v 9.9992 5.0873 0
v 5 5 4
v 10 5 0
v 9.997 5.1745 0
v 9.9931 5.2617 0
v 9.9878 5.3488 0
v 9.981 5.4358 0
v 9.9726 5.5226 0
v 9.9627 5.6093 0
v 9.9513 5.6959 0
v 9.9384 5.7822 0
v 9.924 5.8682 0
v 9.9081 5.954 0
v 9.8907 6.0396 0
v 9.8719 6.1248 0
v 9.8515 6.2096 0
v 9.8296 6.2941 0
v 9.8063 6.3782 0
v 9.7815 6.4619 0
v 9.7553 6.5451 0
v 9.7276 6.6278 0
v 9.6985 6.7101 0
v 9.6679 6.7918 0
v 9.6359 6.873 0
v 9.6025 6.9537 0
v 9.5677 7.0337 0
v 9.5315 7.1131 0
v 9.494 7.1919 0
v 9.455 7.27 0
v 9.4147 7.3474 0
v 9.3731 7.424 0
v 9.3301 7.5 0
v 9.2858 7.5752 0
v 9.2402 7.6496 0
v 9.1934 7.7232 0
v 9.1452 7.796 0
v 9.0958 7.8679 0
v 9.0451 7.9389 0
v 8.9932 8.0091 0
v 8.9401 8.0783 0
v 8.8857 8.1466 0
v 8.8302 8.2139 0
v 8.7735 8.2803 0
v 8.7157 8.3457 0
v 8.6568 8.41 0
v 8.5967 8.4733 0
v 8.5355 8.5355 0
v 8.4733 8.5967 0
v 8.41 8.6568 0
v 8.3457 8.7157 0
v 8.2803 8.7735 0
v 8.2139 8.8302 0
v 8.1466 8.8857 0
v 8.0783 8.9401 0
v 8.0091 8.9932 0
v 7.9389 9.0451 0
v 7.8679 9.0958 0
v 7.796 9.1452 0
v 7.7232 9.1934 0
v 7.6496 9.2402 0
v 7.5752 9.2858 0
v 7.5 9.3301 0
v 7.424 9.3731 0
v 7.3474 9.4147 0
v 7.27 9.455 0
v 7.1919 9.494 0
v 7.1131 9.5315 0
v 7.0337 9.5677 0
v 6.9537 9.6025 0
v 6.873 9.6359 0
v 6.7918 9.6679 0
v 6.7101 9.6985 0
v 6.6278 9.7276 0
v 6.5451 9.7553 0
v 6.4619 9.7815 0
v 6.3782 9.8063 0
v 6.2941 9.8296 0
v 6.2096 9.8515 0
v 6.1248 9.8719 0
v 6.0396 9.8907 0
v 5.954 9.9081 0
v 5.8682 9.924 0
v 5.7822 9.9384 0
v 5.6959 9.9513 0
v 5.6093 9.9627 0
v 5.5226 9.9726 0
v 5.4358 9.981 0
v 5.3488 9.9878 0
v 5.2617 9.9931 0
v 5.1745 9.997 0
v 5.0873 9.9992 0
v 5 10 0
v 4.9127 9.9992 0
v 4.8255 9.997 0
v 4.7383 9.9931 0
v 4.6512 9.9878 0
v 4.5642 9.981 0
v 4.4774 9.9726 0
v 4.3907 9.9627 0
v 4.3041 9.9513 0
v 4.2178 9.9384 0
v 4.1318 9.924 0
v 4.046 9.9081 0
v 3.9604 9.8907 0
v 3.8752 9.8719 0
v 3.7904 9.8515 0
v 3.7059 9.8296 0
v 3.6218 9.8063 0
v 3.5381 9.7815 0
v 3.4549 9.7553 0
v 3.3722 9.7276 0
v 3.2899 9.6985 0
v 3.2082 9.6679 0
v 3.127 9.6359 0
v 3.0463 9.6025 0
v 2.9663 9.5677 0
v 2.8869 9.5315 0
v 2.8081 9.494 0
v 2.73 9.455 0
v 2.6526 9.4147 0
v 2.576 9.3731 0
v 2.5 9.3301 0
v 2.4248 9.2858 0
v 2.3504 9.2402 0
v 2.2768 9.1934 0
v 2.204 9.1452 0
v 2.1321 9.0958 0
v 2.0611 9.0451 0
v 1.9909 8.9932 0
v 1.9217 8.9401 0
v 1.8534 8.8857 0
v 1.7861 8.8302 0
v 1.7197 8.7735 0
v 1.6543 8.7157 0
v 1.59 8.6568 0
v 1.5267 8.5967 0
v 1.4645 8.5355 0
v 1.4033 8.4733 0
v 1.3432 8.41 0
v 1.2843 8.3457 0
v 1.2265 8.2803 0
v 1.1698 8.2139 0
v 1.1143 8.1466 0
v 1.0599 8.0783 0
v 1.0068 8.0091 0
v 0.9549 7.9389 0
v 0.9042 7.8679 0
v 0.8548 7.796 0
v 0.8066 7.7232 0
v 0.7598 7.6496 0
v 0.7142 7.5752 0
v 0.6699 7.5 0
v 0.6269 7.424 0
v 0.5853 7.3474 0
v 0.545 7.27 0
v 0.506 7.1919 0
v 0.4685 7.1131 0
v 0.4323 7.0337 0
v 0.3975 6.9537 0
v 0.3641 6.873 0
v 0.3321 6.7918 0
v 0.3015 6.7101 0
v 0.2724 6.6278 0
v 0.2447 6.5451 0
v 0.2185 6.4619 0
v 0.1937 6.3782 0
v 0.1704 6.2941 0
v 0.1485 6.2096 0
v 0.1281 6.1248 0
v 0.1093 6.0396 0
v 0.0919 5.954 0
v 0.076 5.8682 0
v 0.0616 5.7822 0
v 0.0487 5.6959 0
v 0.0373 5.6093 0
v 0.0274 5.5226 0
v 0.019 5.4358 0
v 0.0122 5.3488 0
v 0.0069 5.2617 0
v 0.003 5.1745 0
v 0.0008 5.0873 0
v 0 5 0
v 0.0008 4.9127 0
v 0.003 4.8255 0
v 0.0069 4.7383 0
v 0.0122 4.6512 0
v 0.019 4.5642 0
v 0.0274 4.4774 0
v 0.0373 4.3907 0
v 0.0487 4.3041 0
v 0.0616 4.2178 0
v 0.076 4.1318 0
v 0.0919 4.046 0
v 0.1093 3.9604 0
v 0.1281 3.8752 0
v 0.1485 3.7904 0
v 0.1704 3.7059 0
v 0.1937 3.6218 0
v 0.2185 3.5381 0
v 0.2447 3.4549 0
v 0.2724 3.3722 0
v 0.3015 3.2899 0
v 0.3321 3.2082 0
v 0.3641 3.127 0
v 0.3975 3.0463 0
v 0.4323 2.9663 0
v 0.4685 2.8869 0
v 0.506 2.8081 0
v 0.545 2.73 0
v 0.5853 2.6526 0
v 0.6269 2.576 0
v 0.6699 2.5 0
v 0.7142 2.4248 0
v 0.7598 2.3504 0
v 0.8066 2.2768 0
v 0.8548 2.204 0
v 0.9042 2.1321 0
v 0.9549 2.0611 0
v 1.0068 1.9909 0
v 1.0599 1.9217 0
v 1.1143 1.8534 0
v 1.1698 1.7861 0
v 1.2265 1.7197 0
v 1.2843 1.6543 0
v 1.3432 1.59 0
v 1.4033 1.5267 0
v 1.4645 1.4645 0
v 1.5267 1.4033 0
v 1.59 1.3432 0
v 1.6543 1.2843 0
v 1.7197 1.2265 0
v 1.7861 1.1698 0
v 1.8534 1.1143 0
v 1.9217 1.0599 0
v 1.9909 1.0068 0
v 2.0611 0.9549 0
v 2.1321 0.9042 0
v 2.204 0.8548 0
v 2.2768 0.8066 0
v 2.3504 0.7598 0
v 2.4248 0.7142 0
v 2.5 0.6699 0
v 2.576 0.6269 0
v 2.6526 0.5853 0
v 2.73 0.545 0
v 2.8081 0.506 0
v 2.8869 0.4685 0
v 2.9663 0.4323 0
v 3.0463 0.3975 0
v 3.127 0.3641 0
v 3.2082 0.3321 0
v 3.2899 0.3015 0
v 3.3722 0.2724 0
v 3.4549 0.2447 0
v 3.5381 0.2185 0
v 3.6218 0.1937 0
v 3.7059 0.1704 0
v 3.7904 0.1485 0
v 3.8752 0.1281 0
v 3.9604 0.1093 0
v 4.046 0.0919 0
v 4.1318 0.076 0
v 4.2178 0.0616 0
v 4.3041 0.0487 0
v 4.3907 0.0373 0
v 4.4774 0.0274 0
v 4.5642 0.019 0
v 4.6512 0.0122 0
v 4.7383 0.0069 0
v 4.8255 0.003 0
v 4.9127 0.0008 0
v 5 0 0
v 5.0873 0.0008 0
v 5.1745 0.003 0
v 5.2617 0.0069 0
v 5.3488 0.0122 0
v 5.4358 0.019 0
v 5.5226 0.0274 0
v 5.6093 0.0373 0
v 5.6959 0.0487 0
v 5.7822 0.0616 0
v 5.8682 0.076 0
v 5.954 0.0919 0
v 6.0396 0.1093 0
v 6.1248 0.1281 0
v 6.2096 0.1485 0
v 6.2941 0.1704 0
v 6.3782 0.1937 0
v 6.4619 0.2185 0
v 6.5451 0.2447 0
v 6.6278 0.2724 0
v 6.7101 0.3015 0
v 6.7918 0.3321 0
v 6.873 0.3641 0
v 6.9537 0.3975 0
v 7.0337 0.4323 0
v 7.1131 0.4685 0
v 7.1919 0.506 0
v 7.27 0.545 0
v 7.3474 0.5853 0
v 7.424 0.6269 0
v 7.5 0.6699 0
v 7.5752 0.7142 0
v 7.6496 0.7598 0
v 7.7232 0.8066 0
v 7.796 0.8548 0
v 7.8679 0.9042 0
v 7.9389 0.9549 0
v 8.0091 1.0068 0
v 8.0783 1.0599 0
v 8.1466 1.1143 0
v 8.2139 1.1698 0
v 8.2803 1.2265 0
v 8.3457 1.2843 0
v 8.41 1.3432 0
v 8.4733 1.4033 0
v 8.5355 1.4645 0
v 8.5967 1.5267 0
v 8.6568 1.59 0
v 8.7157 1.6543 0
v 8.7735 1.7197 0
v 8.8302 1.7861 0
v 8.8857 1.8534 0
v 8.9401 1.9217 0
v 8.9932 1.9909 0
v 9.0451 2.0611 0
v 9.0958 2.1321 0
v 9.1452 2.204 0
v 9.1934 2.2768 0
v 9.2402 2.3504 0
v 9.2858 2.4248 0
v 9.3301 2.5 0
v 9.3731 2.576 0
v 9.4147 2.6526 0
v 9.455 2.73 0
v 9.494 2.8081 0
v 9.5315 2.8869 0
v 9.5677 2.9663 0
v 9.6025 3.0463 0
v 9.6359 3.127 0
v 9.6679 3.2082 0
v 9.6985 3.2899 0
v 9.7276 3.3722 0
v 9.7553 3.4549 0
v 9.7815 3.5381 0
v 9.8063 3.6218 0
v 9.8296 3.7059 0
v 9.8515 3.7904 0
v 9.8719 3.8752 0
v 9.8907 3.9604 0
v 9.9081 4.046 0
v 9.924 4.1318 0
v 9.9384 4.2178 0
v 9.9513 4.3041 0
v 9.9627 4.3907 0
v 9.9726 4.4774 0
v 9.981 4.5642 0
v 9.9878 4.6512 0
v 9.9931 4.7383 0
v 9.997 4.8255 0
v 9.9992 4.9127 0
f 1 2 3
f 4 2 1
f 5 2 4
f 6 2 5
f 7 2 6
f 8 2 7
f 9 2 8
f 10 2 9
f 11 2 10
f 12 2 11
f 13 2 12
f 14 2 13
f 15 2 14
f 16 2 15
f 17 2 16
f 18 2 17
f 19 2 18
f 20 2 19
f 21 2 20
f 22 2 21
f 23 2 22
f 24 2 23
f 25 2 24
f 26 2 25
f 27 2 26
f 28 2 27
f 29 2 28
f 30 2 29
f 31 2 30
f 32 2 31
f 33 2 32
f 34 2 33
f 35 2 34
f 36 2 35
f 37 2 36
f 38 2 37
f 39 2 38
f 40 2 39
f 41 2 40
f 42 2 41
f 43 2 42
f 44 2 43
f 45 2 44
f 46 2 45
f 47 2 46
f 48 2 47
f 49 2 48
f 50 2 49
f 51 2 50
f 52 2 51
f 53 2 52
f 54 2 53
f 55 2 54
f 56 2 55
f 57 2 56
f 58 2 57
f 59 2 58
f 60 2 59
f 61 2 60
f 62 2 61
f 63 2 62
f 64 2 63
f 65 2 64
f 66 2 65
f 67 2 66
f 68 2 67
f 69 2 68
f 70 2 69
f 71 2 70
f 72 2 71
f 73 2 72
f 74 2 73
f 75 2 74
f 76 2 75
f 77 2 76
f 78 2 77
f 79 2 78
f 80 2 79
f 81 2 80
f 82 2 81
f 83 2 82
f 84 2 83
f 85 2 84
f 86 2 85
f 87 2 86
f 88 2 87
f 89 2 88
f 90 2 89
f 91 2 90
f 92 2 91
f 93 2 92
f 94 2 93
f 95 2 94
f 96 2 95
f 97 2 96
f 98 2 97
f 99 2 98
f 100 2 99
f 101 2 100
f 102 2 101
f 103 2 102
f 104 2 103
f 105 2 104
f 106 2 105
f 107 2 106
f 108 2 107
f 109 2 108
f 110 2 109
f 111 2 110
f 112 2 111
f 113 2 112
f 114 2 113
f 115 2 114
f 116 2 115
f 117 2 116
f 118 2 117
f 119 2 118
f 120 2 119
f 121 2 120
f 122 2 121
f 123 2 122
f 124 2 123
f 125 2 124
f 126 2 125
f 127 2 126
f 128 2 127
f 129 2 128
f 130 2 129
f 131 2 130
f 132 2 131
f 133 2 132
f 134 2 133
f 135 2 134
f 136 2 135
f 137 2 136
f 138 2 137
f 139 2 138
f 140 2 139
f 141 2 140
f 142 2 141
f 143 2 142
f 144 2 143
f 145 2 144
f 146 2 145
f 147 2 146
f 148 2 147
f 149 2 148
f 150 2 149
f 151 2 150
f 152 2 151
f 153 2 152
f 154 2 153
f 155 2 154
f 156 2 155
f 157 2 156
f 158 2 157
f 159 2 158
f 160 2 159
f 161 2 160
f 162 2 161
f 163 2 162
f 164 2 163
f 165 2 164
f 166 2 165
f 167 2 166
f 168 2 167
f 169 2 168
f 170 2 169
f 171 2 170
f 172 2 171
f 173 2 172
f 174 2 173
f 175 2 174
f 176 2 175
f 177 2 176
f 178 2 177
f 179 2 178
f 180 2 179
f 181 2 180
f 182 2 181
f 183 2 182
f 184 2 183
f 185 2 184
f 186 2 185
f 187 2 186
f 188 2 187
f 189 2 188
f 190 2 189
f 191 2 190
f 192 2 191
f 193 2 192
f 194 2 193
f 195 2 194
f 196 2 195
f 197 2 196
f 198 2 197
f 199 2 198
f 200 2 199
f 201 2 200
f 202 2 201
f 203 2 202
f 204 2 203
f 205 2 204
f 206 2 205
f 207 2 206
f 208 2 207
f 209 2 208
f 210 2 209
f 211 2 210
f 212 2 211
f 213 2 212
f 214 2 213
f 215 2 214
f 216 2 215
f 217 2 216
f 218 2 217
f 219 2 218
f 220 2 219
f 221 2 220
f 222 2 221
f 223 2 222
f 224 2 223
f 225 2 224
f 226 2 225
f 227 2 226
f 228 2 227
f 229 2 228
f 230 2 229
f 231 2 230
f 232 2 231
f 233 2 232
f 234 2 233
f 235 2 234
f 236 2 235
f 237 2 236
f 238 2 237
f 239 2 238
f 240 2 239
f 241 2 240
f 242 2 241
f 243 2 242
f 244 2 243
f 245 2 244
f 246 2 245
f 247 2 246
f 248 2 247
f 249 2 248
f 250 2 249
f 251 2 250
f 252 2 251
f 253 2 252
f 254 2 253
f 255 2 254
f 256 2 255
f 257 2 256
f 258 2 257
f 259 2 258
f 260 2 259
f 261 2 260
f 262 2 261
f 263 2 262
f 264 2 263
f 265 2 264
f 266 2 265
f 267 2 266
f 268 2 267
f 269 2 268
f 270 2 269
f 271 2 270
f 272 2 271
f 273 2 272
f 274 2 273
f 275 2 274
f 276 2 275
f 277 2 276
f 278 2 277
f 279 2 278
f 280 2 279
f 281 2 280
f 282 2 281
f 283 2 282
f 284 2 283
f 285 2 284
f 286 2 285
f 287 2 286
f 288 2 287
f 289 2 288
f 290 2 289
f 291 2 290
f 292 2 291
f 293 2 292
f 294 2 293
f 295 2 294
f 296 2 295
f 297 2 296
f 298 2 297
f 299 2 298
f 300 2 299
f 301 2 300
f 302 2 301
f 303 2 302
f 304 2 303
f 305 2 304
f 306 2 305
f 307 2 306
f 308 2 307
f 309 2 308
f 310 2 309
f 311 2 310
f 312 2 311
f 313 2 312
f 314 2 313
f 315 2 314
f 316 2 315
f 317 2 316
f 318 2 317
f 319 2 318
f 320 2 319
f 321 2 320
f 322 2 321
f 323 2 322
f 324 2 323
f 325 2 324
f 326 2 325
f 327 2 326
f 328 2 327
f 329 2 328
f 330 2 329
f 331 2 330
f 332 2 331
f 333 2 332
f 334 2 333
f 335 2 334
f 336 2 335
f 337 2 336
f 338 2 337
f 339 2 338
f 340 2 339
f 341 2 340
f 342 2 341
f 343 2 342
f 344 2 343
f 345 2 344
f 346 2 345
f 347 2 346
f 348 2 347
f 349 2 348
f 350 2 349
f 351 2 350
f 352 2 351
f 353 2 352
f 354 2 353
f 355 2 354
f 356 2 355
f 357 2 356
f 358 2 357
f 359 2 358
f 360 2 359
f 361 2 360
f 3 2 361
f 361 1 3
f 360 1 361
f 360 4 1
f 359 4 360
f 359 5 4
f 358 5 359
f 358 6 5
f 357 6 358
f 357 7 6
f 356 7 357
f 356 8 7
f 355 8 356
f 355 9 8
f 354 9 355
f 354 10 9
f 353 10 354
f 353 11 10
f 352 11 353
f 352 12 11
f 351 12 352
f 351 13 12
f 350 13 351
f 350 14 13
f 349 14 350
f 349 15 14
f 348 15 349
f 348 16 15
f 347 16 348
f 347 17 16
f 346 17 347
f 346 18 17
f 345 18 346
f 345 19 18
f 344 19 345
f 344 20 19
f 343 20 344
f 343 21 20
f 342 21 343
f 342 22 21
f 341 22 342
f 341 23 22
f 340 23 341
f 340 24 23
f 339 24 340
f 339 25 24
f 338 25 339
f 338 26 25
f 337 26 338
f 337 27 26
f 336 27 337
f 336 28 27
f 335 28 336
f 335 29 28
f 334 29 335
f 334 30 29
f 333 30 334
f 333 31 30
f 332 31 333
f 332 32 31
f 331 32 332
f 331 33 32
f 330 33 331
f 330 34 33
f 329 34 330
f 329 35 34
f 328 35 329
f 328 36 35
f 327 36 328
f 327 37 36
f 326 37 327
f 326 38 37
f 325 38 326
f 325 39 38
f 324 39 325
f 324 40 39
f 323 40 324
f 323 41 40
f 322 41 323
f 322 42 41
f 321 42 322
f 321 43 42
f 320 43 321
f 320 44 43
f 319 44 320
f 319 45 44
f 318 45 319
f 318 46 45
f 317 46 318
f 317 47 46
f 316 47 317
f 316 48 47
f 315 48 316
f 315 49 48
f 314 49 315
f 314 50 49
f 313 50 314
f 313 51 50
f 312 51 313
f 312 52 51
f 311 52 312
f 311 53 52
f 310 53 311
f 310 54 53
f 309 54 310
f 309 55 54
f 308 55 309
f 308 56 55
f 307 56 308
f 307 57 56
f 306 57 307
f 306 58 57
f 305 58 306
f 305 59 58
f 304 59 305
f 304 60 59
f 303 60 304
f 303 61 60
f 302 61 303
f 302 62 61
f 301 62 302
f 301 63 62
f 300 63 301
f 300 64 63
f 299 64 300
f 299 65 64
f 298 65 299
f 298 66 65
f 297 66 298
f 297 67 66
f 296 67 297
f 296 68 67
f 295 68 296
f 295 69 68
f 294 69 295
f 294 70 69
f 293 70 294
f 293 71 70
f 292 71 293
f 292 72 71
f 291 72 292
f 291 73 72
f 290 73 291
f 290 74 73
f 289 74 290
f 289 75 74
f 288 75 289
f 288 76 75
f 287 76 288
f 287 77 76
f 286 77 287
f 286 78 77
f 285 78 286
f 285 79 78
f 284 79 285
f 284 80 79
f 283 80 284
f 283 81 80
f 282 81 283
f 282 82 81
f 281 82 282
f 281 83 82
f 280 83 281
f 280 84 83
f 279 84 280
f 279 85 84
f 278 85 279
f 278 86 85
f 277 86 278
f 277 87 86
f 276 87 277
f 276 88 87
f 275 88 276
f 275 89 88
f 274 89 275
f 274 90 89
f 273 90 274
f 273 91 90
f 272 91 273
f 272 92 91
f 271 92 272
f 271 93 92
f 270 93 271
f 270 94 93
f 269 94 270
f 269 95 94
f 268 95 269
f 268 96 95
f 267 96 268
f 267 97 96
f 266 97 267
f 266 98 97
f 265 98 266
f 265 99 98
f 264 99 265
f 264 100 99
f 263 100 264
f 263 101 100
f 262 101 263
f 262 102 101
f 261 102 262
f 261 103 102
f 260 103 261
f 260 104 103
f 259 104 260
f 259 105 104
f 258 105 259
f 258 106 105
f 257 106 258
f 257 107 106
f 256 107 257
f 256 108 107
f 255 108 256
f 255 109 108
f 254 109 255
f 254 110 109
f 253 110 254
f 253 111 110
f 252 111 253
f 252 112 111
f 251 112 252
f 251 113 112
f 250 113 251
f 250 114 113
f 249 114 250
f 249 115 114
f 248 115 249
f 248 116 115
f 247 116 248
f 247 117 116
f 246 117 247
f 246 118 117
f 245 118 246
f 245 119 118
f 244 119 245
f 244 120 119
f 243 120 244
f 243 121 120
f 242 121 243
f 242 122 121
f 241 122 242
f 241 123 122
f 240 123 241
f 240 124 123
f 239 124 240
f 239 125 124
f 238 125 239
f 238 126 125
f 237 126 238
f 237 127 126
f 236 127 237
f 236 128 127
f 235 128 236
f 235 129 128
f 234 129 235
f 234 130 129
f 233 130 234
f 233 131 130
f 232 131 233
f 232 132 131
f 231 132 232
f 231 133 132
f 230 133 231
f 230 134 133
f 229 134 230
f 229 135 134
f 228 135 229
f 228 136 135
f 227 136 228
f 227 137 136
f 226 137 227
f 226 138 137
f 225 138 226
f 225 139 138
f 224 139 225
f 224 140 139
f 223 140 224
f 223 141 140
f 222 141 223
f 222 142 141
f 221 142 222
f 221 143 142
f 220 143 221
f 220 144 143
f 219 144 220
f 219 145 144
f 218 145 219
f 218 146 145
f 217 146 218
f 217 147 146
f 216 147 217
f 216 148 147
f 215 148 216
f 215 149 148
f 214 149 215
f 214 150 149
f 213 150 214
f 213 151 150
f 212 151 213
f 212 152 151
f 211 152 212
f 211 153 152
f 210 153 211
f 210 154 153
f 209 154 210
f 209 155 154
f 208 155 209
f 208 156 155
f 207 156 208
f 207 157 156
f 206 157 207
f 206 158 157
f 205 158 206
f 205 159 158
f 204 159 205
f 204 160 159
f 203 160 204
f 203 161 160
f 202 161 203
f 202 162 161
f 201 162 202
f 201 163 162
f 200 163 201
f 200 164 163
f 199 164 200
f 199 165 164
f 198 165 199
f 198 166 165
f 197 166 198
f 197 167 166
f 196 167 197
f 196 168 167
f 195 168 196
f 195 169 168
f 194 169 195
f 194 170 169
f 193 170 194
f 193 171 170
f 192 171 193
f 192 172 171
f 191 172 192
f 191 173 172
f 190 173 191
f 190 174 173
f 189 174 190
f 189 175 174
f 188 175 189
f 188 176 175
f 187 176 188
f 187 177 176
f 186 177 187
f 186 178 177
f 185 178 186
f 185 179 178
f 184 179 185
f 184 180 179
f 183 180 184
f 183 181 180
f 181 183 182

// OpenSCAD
// file: common.scad
function shaft() = 3.77;
function nut_width() = 6.5;
function nut_thickness() = 3;
function screw_diameter() =3.25;
function m3_cap_diameter() = 5.5;
function m3_cap_height() = 3.5;

module hex_cap(){
  difference(){
    cylinder(d=3.66, h=3);
    translate([0, 0, 1.25]) cylinder(d=2, h=2, $fn=6);
  }
}

module inverse_hex_cap(){
  cylinder(d=3.66, h=0.5, $fn=360);
  cylinder(d=2, h=1, $fn=6);
}

module nema17_end(top=true, shaft_length=25.6){
  $fn=360;
  difference(){
	 union(){
      linear_extrude(height = 9){
        difference(){
          hull(){
            translate([2, 2, 0]) circle(r=2);
            translate([40.3, 2, 0]) circle(r=2);
            translate([40.3, 40.3, 0]) circle(r=2);
            translate([2, 40.3, 0]) circle(r=2);
	       }
          translate([5.65, 5.65, 0]) circle(d = screw_diameter());
          translate([36.65, 5.65, 0]) circle(d = screw_diameter());
          translate([5.65, 36.65, 0]) circle(d = screw_diameter());
          translate([36.65, 36.65, 0]) circle(d = screw_diameter());
	      }	
	    }
       if (top){
         translate([21.15, 21.15, 9]){
           difference(){
		       cylinder(d=22, h=2);
		       translate([0, 0, -0.5]) cylinder(d=6.5, h=3.5);
		     }
		     translate([0, 0, -0.6]) cylinder(d=5.5, h=shaft_length);
			}
		 }
	  }
	  if (!top){
		  translate([21.15, 21.15, -1]){
			  cylinder(d=7, h=3);
		  }
	  }
	}
}

module nema17_slice(wide=true, height=18){
  $fn=360;
  linear_extrude(height){
    difference(){
      hull(){
        translate([wide?1:2, wide?6.65:7.65, 0]) circle(r=1);
        translate([wide?6.65:7.65, wide?1:2, 0]) circle(r=1);
        translate([wide?37.65:36.65, wide?1:2, 0]) circle(r=1);
        translate([wide?41.3:40.3, wide?6.65:7.65, 0]) circle(r=1);
        translate([wide?41.3:40.3, wide?35.65:34.65, 0]) circle(r=1);
        translate([wide?35.65:34.65, wide?41.3:40.3, 0]) circle(r=1);
        translate([wide?6.65:7.65, wide?41.3:40.3, 0]) circle(r=1);
        translate([wide?1:2, wide?35.65:34.65, 0]) circle(r=1);
      }
      translate([5.65, 5.65, 0]) circle(d = screw_diameter());
      translate([36.65, 5.65, 0]) circle(d = screw_diameter());
      translate([5.65, 36.65, 0]) circle(d = screw_diameter());
      translate([36.65, 36.65, 0]) circle(d = screw_diameter());
    }
  }
}

module nema_17(texture_sides=true, shaft_length=25.6){
  translate([0, 0, 0]) nema17_end(top=false);
  translate([0, 0, 27]) nema17_end(top=true, shaft_length=shaft_length);
  if (texture_sides){
    for (h = [9:1:27]){
	   translate([0, 0, h]) nema17_slice(height = 1, wide=(h%2));
	 }
  } else {
    translate([0, 0, 9]) nema17_slice();
  }
}
// main file
use <common.scad>

$fn = 360;

translate([5, 5, 0]) cylinder(d1=10, d2=0, h=4);
